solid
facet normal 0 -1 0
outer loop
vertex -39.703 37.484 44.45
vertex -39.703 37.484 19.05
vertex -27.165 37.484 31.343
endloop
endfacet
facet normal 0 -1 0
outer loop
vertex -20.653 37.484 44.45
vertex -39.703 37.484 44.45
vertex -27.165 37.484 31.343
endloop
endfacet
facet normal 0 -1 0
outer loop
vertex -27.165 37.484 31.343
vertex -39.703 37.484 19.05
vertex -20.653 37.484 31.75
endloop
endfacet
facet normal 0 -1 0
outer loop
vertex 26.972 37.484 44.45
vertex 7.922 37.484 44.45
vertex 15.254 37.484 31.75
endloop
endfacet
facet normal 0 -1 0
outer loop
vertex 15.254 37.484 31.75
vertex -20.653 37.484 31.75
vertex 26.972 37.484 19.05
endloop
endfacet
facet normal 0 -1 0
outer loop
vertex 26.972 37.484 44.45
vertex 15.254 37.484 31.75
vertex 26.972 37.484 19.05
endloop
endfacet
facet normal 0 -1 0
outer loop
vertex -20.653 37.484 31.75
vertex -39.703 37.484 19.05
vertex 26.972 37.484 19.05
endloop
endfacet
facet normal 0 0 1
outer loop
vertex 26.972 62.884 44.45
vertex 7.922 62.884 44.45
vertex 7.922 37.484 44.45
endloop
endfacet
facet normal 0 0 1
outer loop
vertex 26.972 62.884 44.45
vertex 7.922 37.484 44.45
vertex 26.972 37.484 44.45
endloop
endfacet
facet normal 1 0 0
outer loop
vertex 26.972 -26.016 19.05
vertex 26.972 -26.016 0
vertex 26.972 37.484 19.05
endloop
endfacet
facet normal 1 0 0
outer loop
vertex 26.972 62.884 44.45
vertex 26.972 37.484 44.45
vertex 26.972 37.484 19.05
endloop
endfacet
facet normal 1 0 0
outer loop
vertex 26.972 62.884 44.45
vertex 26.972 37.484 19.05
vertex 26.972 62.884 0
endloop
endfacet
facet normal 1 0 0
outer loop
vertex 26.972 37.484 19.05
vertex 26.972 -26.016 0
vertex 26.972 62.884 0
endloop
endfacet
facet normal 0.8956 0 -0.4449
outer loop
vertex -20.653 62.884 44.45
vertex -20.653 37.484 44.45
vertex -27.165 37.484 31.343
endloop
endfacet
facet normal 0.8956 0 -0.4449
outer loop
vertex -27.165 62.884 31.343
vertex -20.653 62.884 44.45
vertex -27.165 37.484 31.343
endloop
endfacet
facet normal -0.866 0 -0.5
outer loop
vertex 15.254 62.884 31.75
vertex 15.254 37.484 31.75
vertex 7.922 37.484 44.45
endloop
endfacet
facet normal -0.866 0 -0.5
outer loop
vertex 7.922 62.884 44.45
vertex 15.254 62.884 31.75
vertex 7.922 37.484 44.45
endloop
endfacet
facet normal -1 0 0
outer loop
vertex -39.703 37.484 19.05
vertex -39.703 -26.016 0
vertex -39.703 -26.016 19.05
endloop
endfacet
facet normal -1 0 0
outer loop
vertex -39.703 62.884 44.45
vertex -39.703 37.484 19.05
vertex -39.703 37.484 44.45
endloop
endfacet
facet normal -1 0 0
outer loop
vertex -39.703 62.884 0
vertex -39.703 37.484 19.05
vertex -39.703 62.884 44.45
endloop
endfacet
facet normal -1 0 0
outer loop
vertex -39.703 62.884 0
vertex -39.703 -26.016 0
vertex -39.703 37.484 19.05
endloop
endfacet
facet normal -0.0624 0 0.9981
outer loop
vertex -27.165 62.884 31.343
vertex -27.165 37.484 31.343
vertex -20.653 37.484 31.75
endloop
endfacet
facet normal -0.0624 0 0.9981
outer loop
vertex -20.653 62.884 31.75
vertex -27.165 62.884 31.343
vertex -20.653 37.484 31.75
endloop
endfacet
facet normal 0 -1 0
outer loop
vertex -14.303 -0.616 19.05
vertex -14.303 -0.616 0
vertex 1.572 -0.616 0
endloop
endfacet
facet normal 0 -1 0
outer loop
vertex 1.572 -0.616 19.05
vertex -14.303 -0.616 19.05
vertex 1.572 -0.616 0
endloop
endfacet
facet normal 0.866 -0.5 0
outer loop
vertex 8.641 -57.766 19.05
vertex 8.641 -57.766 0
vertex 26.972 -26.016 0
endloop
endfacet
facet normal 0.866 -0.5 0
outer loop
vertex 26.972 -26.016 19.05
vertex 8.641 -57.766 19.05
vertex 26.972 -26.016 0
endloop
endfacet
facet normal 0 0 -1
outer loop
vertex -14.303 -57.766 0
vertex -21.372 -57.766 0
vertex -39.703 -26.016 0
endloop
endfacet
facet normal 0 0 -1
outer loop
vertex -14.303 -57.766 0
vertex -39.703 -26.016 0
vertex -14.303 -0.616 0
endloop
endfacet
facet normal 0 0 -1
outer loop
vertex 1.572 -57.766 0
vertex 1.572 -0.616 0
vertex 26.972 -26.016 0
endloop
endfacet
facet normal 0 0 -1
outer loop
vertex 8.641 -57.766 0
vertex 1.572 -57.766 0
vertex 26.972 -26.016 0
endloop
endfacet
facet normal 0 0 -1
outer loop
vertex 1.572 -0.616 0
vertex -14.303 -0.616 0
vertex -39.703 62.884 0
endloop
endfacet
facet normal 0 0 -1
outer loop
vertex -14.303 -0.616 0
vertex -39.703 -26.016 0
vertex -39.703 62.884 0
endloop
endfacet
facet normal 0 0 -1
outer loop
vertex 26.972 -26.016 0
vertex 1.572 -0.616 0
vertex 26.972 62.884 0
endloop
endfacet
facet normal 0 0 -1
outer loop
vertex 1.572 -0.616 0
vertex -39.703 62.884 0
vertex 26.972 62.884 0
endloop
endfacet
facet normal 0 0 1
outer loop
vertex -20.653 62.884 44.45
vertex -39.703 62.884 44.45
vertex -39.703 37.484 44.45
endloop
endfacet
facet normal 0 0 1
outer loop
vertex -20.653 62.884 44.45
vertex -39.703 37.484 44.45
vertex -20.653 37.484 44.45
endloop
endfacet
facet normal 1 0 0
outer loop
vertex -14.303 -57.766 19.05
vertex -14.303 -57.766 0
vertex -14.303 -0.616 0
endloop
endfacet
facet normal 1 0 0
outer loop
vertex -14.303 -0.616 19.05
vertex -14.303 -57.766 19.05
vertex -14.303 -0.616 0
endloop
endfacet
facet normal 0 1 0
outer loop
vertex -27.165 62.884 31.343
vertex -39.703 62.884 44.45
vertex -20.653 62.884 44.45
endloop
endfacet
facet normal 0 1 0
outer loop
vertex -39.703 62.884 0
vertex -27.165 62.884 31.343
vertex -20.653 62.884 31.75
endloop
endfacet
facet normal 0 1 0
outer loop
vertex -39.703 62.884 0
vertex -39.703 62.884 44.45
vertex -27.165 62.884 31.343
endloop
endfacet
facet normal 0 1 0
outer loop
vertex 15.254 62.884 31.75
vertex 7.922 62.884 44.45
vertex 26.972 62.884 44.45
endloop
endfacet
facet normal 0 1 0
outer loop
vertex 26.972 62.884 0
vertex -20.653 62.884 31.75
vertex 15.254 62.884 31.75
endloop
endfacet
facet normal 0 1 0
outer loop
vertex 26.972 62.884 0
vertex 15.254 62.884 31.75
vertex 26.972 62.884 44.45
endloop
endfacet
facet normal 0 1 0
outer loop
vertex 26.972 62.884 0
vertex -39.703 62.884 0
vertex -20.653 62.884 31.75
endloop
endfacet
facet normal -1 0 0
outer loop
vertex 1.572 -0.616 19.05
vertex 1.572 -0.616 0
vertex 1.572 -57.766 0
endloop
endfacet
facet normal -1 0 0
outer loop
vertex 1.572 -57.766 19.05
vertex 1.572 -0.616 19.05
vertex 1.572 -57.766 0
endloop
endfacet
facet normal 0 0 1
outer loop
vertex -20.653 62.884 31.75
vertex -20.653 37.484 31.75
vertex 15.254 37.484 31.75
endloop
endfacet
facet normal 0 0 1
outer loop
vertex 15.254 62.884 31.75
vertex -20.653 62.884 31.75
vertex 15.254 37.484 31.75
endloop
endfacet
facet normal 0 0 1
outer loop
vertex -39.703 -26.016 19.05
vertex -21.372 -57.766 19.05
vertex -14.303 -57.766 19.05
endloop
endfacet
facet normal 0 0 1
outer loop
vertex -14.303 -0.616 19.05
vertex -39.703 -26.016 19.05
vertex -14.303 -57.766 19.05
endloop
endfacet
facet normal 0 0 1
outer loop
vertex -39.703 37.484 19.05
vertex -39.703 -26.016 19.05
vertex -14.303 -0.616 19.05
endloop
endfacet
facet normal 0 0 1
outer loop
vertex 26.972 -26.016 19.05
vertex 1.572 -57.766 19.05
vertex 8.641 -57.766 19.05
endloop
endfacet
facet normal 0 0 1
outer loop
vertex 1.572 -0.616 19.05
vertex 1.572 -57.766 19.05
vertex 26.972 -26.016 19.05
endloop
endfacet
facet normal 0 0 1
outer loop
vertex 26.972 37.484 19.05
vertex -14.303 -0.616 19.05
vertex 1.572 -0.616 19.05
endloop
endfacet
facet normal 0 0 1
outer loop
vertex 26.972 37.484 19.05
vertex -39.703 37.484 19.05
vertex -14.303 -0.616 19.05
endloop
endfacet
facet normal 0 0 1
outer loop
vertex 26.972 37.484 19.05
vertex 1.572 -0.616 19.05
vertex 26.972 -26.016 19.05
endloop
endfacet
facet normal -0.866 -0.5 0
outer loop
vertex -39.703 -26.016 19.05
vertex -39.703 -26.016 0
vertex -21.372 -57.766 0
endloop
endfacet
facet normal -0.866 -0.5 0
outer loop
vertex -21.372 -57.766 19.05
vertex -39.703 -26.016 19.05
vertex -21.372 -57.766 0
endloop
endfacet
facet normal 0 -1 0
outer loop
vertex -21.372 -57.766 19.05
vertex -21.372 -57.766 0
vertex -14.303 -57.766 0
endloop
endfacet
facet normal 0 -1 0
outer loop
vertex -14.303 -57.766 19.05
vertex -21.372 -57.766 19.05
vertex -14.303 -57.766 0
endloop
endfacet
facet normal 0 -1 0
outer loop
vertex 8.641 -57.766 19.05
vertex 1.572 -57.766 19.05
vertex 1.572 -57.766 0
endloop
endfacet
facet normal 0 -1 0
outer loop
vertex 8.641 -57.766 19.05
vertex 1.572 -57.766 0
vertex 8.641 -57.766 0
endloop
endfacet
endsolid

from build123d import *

# Parameters (mm, degrees)
F1_DEPTH = 19.05
F0_W     = 28.575
F0_H     = 25.4
F2_DEPTH = 31.75
F0_W_2   = 19.05
F3_DEPTH = 44.45
F5_DEPTH = 25.401


with BuildPart() as f1:
    # F0 (on Top) → F1 (new body)
    with BuildSketch(Plane.XY):
        Polygon((-20.6530114731, 37.4838656797), (-39.7030114731, 37.4838656797), (-39.7030114731, -26.0161343203), (-21.3721404263, -57.7661343203), (-14.3030114731, -57.7661343203), (-14.3030114731, -0.6161343203), (1.5719885269, -0.6161343203), (1.5719885269, -57.7661343203), (8.6411174801, -57.7661343203), (26.9719885269, -26.0161343203), (26.9719885269, 37.4838656797), (7.9219885269, 37.4838656797), align=None)
    extrude(amount=F1_DEPTH)

    # F0 (on Top) → F2 (join)
    with BuildSketch(Plane.XY):
        with Locations((-6.3655114731, 50.1838656797)):
            Rectangle(F0_W, F0_H)
    extrude(amount=F2_DEPTH)

    # F0 (on Top) → F3 (join)
    with BuildSketch(Plane.XY):
        with Locations((-30.1780114731, 50.1838656797)):
            Rectangle(F0_W_2, F0_H)
        with Locations((17.4469885269, 50.1838656797)):
            Rectangle(F0_W_2, F0_H)
    extrude(amount=F3_DEPTH)

    # F4 (on face) → F5 (cut, through all)
    with BuildSketch(Plane.XZ.offset(-37.4838656797)):
        Polygon((-20.6530114731, 31.75), (-20.6530114731, 44.45), (-27.1653852305, 31.342598024), align=None)
        Polygon((7.9219885269, 44.45), (7.9219885269, 31.75), (15.2543369456, 31.75), align=None)
    extrude(amount=-F5_DEPTH, mode=Mode.SUBTRACT)


solid = f1.part
